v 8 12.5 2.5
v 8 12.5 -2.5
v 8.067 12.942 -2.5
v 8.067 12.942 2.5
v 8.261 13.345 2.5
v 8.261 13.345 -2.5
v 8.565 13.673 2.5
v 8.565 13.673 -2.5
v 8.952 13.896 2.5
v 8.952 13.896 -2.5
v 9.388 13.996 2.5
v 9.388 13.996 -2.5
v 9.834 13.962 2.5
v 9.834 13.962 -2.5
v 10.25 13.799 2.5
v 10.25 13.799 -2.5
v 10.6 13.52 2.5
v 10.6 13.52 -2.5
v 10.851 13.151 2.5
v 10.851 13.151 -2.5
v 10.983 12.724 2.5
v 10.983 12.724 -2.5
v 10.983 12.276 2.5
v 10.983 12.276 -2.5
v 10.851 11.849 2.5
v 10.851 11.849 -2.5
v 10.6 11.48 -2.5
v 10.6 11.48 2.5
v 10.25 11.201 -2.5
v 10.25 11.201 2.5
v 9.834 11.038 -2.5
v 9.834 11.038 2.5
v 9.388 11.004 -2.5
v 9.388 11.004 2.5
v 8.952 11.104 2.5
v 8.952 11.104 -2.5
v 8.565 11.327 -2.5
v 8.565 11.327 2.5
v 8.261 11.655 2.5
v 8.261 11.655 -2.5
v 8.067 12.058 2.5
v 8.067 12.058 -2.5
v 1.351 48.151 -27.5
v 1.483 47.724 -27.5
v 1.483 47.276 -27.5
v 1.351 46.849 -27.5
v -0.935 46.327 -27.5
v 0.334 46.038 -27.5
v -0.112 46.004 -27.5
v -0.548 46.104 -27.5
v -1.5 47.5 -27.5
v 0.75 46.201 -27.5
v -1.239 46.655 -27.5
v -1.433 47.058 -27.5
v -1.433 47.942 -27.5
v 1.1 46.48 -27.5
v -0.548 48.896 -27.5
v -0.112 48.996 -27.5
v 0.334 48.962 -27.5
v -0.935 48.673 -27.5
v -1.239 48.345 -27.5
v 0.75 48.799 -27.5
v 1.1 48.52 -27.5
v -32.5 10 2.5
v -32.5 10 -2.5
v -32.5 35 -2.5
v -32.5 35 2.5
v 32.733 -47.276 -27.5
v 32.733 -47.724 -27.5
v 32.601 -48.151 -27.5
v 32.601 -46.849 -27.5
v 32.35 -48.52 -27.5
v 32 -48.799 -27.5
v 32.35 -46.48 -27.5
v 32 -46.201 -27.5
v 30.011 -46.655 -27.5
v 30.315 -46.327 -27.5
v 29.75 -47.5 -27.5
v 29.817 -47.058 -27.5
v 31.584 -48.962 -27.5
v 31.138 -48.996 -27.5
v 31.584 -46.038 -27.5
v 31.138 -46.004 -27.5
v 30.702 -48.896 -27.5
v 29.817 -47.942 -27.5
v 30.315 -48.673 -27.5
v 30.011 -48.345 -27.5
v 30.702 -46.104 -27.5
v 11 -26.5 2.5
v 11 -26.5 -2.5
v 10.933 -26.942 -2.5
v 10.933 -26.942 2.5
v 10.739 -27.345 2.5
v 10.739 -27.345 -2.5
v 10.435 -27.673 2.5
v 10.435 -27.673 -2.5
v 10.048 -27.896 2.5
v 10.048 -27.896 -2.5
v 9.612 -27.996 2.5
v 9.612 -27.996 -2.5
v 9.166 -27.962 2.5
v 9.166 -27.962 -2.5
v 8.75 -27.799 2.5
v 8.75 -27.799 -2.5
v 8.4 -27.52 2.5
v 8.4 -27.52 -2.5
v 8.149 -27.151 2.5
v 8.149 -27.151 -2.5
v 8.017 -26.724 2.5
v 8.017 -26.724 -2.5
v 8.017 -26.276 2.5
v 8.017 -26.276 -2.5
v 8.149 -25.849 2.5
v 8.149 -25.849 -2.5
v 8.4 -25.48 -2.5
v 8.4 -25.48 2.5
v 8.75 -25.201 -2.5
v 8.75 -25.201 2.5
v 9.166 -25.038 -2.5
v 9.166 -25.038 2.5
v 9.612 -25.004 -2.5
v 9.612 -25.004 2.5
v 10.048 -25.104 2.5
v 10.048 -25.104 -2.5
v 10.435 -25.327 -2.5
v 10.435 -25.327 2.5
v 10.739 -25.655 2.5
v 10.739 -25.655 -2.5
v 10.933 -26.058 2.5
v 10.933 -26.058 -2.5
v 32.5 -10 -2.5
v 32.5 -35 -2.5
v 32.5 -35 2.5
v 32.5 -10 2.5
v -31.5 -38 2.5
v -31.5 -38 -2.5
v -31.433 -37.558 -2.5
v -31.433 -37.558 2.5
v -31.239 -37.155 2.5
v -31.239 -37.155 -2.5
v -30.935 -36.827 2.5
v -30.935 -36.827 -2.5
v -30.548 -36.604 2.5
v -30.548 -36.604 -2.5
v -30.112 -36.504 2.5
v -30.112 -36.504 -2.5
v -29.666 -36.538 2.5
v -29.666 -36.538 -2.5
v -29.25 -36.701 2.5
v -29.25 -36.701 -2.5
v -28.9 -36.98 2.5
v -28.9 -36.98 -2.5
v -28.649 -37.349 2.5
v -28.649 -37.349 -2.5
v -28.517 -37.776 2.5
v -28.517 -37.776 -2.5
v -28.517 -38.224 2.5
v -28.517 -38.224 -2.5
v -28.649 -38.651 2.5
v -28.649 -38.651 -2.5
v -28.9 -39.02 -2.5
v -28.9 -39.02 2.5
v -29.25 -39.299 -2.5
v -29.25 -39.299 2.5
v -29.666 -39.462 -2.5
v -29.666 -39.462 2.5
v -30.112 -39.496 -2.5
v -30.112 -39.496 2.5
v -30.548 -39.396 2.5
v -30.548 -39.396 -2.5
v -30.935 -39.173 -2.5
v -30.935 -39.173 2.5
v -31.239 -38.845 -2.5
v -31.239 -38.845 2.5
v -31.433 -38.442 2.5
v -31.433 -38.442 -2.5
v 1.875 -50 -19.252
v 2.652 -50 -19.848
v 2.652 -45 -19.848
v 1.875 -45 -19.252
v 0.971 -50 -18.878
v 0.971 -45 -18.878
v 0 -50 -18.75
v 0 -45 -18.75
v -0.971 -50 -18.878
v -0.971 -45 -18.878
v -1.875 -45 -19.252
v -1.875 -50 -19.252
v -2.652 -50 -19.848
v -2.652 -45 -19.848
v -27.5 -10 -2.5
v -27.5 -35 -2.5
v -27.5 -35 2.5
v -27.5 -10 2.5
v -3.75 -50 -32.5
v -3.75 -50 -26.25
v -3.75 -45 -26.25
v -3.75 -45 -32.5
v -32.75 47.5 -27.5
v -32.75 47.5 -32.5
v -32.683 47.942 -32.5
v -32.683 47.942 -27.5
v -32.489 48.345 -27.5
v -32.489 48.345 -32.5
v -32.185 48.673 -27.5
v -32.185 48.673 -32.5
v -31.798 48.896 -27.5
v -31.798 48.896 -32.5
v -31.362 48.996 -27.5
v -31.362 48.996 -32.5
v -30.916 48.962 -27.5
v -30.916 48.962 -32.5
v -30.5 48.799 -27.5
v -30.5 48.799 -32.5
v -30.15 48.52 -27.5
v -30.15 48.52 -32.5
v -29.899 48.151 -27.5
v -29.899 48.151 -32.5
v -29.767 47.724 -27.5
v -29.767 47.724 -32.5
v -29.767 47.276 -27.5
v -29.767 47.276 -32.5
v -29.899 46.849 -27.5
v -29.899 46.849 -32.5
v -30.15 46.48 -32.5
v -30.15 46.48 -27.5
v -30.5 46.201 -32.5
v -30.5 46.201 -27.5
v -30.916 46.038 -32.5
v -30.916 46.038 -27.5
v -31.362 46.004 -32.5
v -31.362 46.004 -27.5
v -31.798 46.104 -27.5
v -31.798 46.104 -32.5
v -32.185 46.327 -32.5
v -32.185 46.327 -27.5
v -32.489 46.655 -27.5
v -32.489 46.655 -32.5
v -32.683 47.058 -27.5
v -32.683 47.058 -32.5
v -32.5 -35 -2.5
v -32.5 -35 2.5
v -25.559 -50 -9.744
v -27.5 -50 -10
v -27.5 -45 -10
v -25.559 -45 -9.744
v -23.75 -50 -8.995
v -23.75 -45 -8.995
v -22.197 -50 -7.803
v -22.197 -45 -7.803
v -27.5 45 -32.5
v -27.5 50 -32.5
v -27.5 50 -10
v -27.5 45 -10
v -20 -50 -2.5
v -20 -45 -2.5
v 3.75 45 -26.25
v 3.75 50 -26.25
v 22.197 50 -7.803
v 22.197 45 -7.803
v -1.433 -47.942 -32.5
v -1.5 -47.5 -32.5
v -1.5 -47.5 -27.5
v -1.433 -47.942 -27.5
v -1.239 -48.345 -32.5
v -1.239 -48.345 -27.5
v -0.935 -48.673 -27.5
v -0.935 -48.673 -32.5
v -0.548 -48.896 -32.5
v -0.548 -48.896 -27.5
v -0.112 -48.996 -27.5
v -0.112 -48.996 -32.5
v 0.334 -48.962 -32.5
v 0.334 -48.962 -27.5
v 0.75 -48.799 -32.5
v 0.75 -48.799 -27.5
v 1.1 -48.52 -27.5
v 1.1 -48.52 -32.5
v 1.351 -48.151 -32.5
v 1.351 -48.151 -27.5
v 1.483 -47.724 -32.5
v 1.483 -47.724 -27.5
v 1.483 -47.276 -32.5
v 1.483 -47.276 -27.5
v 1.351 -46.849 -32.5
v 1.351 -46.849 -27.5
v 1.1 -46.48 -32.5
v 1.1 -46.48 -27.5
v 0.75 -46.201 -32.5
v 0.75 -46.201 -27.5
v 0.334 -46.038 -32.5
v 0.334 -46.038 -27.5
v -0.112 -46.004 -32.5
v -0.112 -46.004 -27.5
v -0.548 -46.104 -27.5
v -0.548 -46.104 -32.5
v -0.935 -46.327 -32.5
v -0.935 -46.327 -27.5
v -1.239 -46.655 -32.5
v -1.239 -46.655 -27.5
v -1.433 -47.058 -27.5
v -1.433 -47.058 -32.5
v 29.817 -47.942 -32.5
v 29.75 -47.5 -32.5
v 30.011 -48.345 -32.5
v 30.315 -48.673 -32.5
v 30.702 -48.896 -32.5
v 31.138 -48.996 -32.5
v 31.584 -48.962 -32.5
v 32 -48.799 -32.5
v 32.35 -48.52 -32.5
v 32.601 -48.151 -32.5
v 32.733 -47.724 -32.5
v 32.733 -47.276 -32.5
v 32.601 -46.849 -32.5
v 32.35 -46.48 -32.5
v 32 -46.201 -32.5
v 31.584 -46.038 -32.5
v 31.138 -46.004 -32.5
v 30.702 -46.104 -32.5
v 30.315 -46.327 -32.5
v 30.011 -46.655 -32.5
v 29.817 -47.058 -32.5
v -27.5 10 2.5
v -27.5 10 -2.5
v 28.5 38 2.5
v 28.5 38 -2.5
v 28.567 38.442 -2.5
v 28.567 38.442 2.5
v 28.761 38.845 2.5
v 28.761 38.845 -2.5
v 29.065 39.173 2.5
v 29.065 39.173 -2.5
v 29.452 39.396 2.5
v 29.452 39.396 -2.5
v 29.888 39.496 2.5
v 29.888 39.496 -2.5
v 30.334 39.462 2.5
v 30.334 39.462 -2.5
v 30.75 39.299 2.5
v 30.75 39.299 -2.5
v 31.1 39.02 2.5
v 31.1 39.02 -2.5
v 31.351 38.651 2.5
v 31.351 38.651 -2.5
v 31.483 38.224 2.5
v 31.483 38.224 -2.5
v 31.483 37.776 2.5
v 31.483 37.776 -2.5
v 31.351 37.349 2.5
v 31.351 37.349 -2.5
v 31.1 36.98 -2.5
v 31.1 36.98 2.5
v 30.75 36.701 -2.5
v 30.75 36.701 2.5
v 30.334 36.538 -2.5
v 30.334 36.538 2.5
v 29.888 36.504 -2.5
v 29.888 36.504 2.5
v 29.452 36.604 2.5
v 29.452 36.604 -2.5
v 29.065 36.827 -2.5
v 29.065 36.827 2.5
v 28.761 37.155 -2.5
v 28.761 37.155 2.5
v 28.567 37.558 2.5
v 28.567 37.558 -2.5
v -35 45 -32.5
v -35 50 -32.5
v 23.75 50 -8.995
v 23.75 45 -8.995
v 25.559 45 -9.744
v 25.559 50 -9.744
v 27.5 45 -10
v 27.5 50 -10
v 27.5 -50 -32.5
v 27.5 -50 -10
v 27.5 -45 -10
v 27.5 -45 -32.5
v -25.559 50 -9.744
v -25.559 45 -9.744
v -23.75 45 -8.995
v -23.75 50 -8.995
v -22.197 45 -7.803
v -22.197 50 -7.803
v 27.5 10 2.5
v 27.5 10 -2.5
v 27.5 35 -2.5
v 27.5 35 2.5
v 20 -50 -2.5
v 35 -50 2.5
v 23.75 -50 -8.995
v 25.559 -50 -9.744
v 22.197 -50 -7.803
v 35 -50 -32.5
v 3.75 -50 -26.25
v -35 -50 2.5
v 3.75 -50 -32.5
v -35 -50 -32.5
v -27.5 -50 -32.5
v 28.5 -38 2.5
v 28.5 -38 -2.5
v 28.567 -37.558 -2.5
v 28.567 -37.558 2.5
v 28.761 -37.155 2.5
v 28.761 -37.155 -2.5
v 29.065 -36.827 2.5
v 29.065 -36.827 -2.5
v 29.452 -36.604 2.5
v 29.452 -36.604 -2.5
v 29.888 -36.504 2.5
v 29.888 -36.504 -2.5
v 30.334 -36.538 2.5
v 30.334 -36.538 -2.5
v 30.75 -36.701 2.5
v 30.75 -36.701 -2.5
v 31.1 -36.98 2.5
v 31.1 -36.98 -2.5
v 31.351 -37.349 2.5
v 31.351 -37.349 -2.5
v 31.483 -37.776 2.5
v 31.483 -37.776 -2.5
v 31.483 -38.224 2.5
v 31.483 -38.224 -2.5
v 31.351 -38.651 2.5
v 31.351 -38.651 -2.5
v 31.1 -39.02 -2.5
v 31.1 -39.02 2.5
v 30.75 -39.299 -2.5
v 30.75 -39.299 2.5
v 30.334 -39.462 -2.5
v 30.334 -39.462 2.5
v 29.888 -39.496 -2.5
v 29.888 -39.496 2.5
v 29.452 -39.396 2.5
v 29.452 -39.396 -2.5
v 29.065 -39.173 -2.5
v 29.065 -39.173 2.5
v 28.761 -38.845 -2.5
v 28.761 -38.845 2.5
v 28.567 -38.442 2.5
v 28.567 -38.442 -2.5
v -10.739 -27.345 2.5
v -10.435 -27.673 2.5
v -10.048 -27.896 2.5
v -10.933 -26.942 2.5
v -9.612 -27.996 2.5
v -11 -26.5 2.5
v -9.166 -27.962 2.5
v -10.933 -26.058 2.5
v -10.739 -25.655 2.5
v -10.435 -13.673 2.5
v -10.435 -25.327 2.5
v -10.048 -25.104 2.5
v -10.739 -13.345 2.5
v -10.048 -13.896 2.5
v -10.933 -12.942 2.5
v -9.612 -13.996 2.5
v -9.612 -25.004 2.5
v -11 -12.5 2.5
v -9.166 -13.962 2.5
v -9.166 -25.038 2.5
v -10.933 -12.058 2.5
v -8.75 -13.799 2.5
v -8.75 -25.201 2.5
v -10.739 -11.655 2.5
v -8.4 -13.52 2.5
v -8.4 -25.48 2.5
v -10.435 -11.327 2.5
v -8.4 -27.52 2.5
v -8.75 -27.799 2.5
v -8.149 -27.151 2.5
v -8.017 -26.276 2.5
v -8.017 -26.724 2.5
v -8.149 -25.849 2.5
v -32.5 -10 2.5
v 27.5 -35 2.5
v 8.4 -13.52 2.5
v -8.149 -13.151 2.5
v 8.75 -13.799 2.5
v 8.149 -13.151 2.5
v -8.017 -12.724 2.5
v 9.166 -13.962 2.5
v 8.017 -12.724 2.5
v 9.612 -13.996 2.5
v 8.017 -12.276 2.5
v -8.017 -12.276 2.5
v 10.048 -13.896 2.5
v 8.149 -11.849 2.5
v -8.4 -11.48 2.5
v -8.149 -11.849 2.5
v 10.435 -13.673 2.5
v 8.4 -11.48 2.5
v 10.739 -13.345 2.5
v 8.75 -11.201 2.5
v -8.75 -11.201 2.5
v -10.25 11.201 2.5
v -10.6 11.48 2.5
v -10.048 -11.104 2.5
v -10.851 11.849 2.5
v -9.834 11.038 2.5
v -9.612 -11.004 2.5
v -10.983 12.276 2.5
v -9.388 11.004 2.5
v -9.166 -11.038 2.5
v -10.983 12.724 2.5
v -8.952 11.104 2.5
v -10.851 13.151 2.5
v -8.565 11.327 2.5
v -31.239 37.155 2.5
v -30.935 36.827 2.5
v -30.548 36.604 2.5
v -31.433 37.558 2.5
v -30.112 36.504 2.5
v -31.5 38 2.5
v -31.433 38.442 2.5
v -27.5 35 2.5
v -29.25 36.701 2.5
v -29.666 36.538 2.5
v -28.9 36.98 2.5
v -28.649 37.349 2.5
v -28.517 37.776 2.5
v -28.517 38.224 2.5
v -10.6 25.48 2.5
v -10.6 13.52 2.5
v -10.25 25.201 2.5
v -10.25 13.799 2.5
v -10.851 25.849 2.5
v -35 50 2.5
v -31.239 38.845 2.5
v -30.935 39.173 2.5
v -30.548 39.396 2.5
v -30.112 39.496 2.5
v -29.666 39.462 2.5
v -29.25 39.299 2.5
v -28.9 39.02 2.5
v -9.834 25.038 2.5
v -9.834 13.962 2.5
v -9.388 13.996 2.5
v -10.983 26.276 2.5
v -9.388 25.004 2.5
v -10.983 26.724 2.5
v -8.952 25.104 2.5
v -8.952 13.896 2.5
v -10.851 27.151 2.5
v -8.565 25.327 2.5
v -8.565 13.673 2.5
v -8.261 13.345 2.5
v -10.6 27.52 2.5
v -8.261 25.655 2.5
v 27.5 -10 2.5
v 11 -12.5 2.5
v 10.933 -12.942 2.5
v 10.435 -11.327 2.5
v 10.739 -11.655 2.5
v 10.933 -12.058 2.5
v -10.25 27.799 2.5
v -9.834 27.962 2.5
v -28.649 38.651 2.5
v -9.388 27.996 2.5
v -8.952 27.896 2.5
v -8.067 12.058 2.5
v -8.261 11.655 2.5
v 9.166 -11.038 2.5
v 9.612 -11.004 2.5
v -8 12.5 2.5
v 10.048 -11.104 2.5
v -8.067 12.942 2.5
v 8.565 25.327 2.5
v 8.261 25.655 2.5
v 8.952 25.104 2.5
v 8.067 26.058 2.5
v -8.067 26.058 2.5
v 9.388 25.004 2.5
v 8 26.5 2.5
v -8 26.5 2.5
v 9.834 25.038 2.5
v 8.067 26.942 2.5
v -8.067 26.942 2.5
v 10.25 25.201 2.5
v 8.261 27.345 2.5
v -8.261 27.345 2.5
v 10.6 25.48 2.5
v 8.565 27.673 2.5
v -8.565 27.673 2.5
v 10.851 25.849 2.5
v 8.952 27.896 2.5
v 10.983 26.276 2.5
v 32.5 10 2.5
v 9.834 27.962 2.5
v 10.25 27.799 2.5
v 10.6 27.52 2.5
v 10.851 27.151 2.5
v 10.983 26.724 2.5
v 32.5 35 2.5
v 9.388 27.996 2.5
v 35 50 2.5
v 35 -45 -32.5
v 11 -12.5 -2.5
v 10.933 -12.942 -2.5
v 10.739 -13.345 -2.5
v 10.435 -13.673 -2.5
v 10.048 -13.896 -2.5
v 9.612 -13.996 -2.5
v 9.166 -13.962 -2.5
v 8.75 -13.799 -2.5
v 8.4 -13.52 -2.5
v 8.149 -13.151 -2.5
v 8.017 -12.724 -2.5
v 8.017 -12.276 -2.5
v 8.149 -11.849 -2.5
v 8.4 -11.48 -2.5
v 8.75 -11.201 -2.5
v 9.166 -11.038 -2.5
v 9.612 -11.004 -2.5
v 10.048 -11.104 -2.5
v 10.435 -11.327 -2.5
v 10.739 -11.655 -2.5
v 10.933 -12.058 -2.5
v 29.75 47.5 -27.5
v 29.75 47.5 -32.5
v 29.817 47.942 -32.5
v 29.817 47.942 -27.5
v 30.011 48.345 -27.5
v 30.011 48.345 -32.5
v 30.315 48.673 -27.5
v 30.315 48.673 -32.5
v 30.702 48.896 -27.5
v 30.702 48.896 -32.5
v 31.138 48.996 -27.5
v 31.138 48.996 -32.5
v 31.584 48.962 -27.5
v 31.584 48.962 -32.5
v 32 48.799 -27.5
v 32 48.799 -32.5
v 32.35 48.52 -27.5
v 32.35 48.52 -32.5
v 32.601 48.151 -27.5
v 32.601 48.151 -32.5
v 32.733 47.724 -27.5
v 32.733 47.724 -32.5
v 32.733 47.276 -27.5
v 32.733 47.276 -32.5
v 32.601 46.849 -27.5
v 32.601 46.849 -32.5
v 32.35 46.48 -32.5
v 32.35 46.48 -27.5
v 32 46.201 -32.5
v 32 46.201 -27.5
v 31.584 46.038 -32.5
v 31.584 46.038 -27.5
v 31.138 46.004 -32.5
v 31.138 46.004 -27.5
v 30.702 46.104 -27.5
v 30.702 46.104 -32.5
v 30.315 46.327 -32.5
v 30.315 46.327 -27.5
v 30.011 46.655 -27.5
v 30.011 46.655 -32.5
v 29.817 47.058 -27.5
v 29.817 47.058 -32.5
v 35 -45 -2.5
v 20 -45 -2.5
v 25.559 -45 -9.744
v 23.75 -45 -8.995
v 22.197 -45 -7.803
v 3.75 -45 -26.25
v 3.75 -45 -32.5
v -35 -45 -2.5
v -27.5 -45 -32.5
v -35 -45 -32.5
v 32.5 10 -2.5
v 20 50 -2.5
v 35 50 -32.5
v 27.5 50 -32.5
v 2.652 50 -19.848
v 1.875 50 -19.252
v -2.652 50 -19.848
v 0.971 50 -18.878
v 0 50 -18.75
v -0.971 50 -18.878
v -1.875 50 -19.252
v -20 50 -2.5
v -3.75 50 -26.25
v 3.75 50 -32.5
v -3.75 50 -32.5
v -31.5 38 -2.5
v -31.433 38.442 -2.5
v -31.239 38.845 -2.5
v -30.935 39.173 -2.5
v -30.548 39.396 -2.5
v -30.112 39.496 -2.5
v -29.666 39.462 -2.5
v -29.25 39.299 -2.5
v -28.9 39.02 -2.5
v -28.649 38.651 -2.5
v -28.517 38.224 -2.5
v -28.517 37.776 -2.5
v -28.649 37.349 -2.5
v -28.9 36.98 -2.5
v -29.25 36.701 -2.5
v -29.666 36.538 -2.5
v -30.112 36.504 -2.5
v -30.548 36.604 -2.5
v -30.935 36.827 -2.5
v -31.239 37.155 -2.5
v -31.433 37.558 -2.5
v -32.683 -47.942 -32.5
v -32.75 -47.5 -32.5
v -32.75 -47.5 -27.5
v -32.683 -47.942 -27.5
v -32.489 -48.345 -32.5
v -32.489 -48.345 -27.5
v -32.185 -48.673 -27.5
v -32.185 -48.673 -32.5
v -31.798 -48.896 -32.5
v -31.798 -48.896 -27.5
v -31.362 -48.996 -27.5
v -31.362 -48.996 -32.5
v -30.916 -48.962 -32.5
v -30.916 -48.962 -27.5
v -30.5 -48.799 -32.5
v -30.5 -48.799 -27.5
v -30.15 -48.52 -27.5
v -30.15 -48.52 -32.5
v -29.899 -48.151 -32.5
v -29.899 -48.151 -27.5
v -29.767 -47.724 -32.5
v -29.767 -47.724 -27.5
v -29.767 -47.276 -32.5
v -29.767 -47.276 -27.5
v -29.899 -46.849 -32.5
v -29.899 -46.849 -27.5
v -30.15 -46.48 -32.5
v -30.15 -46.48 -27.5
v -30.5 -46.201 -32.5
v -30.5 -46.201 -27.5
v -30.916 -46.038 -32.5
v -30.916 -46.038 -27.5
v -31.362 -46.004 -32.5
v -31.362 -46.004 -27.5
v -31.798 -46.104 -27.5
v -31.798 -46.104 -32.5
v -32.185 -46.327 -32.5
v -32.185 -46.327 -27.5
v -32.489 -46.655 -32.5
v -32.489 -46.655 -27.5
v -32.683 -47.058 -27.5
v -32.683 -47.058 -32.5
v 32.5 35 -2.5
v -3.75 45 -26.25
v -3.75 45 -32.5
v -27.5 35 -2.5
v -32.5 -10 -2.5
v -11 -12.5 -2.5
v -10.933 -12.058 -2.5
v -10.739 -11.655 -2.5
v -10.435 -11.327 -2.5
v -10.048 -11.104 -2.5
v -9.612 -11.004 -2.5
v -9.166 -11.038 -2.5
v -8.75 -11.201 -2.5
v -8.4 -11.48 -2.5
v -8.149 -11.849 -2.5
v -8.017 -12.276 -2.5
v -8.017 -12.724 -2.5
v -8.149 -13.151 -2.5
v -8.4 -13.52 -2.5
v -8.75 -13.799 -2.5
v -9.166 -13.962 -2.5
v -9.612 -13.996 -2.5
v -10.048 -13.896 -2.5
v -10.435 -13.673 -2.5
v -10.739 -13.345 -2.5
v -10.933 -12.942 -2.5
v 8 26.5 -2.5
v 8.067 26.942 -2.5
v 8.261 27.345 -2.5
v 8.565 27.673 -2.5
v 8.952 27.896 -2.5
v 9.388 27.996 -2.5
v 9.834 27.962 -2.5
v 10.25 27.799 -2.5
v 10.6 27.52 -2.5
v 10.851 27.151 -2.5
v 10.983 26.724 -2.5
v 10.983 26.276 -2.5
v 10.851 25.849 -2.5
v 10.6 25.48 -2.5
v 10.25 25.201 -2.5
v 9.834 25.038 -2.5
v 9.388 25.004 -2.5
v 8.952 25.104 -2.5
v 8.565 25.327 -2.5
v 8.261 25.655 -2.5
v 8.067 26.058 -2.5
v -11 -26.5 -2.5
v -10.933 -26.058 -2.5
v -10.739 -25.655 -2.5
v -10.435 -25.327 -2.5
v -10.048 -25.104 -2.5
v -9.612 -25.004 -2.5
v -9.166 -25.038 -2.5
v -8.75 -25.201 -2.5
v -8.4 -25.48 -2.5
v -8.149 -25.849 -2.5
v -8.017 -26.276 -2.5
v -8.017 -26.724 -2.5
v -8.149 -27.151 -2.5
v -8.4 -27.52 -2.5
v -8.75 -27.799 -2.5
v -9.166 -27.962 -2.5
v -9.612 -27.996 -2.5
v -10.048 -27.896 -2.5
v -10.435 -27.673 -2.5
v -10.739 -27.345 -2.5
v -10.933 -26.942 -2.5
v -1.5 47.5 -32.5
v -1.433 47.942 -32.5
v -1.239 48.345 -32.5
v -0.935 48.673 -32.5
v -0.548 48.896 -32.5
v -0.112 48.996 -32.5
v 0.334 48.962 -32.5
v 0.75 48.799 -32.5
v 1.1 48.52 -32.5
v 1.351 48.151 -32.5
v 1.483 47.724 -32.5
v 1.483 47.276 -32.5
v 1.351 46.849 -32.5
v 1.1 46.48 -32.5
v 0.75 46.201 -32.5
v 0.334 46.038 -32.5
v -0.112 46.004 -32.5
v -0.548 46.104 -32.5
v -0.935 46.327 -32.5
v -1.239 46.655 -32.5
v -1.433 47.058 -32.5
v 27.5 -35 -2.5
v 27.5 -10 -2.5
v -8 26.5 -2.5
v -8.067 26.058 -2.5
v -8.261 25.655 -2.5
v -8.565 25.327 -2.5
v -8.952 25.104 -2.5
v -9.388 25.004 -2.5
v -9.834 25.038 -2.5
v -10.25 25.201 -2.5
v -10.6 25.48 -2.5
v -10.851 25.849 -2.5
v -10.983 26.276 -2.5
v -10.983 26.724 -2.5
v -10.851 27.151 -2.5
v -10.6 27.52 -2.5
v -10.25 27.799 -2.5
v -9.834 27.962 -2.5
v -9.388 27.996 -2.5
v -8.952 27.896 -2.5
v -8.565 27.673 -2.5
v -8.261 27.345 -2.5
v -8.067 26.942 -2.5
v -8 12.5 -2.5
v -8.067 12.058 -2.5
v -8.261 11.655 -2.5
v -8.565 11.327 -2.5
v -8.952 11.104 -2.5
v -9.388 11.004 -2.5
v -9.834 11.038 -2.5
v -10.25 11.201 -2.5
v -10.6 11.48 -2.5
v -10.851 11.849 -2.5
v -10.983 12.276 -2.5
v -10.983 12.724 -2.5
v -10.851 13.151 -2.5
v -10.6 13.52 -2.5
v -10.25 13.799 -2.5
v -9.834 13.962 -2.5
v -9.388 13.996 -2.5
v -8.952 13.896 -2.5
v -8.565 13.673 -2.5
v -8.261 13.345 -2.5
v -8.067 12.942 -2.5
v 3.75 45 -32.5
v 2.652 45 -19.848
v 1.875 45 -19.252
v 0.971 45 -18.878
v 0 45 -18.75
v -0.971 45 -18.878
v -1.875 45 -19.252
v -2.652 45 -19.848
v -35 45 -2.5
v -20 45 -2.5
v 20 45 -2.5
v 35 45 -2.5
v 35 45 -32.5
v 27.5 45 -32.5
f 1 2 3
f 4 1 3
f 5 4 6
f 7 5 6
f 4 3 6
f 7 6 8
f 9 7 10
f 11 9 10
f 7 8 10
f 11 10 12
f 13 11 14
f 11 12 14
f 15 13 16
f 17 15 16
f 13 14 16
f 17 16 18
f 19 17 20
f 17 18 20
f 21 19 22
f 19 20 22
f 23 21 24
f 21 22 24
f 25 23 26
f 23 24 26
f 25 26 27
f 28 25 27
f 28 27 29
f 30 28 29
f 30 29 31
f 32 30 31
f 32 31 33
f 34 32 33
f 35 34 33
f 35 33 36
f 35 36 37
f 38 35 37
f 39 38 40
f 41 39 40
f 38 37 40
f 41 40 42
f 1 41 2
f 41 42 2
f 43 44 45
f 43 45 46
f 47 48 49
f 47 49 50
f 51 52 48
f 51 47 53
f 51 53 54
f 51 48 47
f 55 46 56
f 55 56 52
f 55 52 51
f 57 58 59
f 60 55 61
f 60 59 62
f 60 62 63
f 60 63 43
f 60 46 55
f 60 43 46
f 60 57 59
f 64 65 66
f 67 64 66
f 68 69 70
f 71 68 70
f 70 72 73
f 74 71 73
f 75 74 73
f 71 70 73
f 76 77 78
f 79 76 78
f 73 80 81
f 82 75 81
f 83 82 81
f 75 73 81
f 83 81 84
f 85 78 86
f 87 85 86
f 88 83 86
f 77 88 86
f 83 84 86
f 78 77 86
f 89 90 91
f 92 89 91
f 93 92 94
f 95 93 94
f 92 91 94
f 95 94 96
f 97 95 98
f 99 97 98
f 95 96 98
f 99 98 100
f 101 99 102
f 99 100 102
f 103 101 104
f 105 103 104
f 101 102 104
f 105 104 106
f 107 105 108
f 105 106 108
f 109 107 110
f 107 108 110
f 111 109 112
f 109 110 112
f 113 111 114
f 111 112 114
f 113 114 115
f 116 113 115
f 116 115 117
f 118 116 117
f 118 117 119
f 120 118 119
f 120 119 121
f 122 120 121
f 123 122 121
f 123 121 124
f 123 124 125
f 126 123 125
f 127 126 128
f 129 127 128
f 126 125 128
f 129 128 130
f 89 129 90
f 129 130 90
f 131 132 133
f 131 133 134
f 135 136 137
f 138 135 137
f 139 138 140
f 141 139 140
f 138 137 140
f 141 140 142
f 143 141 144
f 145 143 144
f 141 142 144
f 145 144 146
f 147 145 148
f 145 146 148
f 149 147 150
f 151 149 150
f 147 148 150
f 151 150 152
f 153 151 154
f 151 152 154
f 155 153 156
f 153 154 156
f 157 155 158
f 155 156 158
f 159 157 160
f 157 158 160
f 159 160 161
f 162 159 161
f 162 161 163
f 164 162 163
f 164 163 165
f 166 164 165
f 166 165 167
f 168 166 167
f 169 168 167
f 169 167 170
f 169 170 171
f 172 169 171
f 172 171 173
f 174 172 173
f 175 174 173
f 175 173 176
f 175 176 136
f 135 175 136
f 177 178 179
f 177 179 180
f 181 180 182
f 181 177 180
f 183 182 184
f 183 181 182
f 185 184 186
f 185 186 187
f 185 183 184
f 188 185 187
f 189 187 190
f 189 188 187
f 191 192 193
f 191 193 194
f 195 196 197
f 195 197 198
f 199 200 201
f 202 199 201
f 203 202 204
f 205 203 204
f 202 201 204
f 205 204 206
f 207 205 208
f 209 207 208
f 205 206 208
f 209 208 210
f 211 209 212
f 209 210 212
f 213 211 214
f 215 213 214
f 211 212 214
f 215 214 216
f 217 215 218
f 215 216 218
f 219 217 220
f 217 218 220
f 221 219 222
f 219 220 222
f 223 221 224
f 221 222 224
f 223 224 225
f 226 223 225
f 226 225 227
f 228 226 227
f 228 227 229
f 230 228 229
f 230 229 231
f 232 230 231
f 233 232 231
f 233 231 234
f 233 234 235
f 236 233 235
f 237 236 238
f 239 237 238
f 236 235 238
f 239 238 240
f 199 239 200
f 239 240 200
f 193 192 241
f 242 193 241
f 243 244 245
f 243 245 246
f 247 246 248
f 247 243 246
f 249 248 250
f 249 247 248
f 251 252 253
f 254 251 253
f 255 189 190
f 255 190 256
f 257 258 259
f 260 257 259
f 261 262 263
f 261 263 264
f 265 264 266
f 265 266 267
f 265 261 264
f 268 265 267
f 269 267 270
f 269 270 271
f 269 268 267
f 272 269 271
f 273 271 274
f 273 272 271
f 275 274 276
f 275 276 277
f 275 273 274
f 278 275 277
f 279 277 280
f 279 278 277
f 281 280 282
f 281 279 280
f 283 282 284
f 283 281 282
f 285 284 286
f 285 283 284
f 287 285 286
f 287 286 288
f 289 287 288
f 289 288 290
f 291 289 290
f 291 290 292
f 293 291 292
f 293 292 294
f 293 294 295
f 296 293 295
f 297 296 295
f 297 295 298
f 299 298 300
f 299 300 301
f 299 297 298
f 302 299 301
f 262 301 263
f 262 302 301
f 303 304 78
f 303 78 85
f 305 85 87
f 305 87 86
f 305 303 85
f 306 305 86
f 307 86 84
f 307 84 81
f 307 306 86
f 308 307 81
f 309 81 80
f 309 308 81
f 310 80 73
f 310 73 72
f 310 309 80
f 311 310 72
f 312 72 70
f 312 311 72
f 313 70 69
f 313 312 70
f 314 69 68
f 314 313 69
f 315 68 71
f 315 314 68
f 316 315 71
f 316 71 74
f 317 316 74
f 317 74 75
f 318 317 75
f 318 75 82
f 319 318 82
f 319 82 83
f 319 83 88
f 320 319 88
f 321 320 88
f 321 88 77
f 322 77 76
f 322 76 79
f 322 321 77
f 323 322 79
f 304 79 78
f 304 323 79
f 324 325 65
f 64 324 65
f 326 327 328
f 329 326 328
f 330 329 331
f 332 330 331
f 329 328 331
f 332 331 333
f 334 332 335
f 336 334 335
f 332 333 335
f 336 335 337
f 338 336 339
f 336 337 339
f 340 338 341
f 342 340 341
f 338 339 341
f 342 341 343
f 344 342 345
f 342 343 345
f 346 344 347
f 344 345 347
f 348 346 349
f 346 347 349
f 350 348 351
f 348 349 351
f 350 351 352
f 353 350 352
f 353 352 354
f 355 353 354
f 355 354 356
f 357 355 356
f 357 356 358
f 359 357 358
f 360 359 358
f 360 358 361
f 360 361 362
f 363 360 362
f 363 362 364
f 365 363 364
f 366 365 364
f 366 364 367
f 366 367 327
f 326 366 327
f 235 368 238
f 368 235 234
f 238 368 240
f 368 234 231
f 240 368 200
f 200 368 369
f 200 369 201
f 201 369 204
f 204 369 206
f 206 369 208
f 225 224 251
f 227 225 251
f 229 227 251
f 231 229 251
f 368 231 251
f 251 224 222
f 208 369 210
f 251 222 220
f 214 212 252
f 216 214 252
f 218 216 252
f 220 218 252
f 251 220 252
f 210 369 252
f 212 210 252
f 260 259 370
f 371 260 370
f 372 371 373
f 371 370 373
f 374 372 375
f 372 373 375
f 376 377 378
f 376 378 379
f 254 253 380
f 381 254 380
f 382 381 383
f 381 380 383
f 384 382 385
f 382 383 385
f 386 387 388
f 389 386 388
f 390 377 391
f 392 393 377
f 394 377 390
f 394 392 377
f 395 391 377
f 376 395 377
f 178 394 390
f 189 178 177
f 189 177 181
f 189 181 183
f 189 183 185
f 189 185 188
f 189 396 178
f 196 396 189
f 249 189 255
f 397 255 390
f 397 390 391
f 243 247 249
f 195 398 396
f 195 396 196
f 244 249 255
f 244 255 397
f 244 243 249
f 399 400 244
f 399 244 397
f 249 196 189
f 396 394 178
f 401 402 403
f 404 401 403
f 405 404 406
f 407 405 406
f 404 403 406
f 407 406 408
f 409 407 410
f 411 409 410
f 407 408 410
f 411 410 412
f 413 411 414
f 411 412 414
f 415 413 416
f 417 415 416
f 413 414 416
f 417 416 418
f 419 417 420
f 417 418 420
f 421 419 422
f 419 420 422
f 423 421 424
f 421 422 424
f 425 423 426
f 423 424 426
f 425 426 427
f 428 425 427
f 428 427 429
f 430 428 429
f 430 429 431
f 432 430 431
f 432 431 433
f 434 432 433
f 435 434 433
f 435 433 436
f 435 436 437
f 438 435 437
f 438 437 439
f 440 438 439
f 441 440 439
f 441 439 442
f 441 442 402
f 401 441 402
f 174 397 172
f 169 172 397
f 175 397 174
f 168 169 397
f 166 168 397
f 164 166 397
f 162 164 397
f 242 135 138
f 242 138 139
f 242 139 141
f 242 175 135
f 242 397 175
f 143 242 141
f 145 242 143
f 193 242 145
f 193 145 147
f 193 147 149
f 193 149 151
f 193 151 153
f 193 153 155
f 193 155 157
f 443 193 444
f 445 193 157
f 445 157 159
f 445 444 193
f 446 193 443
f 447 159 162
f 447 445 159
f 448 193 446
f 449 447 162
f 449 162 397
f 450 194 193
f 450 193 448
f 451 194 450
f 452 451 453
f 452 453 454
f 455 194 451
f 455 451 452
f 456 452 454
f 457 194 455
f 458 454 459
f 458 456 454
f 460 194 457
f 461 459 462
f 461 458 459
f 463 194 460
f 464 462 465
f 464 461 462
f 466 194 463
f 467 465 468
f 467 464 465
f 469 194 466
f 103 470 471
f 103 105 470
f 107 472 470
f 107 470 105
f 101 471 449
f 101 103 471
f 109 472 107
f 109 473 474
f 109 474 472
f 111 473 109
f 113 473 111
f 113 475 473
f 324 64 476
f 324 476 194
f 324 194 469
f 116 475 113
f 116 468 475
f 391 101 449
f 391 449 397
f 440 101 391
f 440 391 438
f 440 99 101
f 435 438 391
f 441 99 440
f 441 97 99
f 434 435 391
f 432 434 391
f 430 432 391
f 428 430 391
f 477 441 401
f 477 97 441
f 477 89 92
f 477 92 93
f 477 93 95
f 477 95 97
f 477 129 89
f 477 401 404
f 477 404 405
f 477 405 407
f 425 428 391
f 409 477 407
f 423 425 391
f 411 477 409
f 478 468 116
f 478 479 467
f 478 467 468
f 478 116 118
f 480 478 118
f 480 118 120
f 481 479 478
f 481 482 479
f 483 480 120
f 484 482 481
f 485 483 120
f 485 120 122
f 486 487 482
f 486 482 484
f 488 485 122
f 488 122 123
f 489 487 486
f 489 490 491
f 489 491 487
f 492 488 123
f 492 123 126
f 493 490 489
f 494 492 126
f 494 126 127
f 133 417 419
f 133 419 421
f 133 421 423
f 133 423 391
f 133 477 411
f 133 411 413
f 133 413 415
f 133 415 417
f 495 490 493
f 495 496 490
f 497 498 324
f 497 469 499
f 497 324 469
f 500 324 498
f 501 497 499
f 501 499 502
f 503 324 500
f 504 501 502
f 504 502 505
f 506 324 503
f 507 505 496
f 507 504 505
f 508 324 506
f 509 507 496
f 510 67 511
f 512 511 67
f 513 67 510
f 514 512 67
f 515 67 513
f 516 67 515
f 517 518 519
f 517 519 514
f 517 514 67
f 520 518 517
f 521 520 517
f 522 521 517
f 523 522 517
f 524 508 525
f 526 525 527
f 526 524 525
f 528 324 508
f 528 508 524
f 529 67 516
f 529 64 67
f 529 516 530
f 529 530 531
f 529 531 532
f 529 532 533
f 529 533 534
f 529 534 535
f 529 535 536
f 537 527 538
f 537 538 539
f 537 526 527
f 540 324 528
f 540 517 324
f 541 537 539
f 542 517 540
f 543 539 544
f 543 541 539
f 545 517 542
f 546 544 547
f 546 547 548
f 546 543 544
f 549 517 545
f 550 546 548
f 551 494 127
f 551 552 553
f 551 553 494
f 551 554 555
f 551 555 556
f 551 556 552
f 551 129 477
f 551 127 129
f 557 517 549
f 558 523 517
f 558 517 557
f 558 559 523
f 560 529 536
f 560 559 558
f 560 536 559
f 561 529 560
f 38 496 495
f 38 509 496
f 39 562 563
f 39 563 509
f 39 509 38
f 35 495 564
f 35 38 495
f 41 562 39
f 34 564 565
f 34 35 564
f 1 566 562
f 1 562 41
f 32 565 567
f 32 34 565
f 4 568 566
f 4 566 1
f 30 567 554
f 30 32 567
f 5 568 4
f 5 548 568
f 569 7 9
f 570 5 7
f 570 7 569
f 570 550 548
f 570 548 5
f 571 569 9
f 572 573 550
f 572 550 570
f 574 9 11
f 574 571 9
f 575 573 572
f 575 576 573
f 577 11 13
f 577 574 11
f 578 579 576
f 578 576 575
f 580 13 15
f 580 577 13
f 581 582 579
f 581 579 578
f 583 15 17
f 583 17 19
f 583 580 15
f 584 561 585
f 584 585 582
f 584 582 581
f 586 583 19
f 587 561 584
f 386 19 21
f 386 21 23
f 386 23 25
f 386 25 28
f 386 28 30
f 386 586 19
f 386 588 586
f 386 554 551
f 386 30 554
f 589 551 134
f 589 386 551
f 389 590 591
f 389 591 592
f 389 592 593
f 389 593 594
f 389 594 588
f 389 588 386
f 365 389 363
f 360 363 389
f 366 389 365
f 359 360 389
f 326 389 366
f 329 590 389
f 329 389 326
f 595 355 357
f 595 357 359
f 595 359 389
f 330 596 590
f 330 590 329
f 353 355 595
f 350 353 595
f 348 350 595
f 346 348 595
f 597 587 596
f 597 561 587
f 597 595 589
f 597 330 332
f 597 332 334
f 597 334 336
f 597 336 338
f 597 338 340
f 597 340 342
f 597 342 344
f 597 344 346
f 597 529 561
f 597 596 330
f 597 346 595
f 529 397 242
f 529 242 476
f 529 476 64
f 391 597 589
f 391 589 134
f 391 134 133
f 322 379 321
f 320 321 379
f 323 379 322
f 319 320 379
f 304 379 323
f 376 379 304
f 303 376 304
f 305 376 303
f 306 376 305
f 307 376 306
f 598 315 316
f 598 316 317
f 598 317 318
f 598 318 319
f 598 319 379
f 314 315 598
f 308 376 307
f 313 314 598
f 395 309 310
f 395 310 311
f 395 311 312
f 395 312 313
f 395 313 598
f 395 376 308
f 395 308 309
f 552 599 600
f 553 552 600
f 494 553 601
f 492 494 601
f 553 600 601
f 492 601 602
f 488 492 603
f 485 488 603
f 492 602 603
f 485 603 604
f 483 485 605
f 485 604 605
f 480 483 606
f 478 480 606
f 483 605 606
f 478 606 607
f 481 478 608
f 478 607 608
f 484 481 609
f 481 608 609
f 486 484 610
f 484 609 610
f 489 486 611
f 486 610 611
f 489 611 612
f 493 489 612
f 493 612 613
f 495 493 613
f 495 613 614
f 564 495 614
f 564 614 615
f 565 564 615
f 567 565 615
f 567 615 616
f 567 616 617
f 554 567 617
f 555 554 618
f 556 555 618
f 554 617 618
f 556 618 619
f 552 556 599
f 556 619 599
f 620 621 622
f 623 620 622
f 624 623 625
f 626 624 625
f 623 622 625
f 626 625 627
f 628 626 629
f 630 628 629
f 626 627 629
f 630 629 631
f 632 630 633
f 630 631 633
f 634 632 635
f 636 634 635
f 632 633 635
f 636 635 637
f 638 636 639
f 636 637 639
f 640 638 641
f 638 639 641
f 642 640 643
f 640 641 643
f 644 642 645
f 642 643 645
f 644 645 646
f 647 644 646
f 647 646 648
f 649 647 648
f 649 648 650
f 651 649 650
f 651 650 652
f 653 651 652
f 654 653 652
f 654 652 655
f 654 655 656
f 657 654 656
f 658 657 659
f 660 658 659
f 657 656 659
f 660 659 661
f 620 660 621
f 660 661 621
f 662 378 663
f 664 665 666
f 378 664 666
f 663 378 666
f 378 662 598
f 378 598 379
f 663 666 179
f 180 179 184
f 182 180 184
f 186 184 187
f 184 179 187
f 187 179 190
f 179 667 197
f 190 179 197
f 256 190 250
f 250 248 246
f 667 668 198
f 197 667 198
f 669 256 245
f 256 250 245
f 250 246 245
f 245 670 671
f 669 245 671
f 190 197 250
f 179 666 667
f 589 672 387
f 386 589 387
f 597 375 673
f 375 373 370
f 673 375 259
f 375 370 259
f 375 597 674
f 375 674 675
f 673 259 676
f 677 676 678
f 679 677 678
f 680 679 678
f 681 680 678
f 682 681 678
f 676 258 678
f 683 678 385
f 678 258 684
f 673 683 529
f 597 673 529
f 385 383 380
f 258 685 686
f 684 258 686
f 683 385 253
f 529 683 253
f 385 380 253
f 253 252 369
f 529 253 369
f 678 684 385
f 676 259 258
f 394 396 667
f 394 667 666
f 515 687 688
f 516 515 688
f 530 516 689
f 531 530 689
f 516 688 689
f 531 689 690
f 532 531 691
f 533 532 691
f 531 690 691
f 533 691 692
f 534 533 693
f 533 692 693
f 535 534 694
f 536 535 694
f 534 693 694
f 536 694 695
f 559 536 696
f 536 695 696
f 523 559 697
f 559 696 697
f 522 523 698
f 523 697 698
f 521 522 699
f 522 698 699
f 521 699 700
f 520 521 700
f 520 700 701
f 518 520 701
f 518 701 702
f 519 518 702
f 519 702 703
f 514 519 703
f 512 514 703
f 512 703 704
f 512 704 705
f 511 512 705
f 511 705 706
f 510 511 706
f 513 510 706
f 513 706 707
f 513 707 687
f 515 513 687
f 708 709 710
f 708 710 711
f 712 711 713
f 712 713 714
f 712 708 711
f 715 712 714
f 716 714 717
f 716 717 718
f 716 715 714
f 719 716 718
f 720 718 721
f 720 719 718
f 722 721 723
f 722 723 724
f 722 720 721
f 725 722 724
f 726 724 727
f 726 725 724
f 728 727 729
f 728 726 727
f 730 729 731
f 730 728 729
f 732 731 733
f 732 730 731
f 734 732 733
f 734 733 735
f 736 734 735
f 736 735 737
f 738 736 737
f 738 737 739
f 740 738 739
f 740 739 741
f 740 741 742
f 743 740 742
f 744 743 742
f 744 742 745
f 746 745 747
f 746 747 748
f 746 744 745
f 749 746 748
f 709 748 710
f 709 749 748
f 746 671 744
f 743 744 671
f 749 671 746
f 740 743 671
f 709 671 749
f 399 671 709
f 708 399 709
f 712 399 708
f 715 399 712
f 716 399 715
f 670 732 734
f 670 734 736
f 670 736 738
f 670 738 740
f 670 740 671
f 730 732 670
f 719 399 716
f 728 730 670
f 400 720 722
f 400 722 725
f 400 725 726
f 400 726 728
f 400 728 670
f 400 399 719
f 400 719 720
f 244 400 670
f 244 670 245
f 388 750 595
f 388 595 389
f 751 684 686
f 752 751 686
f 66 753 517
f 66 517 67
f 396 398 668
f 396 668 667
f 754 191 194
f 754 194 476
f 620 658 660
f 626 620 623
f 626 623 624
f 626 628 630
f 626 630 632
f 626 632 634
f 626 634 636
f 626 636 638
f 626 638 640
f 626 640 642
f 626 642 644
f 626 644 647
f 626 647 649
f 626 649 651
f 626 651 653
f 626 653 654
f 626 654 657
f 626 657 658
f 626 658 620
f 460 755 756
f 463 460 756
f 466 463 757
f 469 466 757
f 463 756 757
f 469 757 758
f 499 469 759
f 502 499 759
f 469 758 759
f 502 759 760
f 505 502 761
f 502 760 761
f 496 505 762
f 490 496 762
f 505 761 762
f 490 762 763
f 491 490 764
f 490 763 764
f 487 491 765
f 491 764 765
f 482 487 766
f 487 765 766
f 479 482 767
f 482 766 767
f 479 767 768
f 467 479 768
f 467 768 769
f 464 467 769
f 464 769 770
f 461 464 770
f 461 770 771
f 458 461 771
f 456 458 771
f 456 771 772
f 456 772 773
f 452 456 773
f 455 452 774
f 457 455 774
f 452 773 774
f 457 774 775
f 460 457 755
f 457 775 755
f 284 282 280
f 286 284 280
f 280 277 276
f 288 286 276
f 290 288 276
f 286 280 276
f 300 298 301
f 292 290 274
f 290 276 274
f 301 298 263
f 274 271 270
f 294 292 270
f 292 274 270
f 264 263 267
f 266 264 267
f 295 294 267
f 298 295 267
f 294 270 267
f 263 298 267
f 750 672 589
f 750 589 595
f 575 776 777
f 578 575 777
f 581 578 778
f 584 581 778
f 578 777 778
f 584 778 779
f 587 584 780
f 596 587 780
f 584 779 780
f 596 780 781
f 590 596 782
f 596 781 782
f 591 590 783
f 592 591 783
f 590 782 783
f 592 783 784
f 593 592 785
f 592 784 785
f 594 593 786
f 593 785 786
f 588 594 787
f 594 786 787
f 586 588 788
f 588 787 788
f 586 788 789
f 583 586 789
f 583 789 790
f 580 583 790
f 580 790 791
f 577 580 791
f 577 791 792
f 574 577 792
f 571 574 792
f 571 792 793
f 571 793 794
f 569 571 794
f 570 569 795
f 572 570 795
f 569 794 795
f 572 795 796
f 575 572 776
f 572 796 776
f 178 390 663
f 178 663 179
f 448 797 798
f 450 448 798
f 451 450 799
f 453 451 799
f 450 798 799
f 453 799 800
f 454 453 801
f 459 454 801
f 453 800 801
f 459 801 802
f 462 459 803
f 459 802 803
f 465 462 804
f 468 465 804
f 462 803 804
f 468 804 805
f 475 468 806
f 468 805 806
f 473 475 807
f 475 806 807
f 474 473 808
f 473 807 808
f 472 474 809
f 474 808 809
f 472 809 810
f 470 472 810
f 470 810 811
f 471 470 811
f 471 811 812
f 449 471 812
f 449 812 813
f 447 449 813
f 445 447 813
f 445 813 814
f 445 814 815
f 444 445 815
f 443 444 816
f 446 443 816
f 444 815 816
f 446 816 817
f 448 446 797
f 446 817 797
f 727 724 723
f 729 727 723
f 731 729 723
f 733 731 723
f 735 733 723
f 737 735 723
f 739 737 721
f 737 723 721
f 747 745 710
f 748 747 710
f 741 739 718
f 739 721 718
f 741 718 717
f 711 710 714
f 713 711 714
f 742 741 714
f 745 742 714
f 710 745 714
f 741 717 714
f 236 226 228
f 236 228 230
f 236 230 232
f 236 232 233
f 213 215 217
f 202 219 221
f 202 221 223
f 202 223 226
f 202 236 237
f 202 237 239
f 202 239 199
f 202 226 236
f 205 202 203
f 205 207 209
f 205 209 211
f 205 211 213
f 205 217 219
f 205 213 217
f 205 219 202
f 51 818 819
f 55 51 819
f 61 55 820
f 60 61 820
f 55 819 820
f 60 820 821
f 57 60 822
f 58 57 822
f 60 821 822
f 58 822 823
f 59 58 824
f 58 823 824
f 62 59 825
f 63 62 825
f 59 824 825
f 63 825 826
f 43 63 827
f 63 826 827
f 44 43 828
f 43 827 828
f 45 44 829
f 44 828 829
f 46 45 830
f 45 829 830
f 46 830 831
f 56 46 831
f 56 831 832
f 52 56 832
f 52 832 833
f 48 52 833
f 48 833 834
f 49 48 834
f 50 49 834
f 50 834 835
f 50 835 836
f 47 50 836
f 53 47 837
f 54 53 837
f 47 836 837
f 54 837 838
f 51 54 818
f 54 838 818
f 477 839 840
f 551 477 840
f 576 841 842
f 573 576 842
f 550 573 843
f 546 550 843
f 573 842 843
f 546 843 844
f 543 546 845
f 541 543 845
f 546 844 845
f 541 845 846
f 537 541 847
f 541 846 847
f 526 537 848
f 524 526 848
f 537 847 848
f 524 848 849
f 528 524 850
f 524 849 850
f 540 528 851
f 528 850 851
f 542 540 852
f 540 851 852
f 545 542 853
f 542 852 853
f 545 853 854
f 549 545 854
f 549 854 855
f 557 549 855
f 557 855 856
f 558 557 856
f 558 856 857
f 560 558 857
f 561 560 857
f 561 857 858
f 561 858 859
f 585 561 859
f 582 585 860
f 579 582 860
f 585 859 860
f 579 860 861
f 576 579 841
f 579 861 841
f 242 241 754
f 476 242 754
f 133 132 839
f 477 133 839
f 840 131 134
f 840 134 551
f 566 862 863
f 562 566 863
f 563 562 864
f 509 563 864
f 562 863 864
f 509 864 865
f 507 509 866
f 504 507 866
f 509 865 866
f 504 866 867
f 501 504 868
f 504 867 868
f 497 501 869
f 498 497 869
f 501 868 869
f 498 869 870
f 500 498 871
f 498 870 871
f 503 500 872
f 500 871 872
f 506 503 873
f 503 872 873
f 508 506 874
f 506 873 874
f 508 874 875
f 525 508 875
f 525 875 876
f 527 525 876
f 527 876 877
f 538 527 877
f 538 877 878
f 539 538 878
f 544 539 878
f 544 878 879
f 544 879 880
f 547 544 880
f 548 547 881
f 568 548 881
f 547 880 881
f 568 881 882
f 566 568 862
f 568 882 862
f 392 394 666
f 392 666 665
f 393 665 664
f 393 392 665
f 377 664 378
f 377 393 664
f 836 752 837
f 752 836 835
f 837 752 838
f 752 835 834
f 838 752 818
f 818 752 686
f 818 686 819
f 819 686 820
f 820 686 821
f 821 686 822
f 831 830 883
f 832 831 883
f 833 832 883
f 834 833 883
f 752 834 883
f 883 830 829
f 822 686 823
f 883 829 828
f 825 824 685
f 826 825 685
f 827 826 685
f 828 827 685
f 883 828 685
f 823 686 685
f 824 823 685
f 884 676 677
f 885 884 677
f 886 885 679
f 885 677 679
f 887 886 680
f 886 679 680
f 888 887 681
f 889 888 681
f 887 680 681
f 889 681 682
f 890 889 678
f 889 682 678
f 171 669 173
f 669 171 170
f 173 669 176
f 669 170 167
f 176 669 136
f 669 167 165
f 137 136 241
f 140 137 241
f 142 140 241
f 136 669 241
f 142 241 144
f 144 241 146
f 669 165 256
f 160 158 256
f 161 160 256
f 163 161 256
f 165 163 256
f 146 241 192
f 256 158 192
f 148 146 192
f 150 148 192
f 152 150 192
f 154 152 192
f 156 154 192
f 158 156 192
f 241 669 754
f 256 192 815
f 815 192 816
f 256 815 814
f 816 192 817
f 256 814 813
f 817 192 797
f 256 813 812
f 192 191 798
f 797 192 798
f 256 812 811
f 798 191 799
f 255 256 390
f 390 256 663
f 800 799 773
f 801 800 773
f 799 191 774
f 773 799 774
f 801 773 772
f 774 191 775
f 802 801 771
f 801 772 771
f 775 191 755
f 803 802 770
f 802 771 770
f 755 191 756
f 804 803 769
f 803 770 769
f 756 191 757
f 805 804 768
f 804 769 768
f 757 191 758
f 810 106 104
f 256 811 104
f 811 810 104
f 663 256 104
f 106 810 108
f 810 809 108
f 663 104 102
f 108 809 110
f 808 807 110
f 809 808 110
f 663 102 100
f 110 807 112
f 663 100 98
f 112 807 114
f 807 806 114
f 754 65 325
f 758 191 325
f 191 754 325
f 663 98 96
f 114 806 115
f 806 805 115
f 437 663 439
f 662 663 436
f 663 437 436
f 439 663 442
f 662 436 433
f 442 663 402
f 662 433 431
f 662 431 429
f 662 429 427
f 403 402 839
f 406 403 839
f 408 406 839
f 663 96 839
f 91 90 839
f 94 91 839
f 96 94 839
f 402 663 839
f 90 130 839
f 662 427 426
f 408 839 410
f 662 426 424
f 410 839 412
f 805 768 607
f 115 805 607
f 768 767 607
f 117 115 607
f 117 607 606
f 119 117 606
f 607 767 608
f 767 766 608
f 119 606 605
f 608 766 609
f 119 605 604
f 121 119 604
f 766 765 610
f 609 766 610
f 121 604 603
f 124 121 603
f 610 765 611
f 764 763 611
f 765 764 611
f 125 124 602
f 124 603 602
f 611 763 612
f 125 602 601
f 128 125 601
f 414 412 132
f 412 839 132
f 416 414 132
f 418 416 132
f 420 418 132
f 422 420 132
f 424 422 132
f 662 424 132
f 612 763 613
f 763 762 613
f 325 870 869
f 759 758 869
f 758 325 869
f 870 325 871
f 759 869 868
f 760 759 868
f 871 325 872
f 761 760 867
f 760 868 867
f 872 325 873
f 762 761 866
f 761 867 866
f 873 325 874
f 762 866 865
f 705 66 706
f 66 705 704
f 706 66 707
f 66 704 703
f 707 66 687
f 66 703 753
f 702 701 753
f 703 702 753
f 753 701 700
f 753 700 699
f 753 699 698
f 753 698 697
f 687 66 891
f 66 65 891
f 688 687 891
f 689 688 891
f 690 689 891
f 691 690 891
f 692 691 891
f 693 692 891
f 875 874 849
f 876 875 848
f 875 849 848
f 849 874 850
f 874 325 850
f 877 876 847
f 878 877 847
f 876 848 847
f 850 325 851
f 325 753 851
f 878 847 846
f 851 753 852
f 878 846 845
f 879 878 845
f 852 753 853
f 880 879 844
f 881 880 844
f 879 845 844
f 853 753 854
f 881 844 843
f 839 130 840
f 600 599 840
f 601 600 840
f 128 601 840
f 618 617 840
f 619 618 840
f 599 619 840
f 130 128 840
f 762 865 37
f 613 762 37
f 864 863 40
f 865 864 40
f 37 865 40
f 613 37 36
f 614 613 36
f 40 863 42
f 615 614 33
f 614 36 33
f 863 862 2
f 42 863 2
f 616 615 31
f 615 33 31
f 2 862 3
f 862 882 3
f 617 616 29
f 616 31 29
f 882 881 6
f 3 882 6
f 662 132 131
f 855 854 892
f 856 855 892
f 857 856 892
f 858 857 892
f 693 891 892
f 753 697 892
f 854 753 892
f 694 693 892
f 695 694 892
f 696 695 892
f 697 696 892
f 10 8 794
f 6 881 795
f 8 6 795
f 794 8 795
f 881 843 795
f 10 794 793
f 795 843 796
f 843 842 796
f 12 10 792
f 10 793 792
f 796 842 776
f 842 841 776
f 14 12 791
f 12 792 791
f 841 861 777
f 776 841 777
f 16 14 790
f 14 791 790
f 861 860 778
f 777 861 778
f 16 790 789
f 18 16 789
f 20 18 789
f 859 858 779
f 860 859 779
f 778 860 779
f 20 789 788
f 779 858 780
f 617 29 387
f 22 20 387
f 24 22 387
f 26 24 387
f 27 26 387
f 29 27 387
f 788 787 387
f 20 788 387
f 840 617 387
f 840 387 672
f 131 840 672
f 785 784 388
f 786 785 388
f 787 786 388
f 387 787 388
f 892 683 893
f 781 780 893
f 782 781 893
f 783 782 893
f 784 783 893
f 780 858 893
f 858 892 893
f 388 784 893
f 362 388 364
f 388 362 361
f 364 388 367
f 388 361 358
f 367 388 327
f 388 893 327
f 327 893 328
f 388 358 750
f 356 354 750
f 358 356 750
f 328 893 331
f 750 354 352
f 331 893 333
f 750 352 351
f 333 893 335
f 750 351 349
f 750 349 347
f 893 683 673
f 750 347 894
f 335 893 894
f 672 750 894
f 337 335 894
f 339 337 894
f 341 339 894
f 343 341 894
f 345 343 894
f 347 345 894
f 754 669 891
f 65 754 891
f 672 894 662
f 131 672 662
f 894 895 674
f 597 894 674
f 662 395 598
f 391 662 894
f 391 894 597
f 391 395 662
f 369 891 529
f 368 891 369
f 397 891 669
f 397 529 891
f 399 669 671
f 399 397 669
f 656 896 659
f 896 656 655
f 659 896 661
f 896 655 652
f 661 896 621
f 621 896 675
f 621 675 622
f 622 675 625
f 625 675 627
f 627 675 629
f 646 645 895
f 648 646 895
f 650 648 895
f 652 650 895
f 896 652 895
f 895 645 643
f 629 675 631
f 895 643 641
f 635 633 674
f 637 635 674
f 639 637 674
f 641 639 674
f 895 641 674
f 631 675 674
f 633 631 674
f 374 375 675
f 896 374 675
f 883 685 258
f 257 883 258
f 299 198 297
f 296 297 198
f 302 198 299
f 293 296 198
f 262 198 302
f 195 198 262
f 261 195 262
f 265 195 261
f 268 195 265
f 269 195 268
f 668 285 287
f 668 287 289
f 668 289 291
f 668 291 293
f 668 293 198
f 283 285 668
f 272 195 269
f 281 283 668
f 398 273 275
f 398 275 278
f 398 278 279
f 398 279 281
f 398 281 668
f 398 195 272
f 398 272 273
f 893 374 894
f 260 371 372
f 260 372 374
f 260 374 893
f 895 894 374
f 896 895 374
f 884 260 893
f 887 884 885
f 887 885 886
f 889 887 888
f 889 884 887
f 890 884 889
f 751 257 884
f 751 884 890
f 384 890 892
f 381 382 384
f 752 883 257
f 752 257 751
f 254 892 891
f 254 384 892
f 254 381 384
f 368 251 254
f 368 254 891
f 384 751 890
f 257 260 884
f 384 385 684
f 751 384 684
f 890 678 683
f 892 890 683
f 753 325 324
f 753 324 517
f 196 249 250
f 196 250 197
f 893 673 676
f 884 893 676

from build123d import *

# Parameters (mm, degrees)
SKETCH1_W           = 70
SKETCH1_H           = 100
BOSS_EXTRUDE1_DEPTH = 2.5
SKETCH2_R           = 1.5
CUT_EXTRUDE1_DEPTH  = 10
BOSS_EXTRUDE2_DEPTH = 5
SKETCH4_W           = 5
SKETCH4_H           = 25
SKETCH4_R           = 1.5
CUT_EXTRUDE2_DEPTH  = 5
SKETCH7_R           = 1.5
CUT_EXTRUDE3_DEPTH  = 5


with BuildPart() as part:
    # Sketch1 → Boss-Extrude1 (new, symmetric)
    with BuildSketch(Plane.XY):
        Rectangle(SKETCH1_W, SKETCH1_H)
    extrude(amount=BOSS_EXTRUDE1_DEPTH, both=True)

    # Sketch2 → Cut-Extrude1 (cut)
    with BuildSketch(Plane(origin=(0, 0, -2.5), x_dir=(-1, 0, 0), z_dir=(0, 0, -1))):
        with Locations((30, 38)):
            Circle(SKETCH2_R)
        with Locations((-30, 38)):
            Circle(SKETCH2_R)
        with Locations((30, -38)):
            Circle(SKETCH2_R)
        with Locations((-30, -38)):
            Circle(SKETCH2_R)
    extrude(amount=-CUT_EXTRUDE1_DEPTH, mode=Mode.SUBTRACT)

    # Sketch3 → Boss-Extrude2 (add)
    with BuildSketch(Plane(origin=(0, 50, 0), x_dir=(1, 0, 0), z_dir=(0, 1, 0))):
        with BuildLine():
            Line((-35, 2.5), (-35, 32.5))
            Line((-35, 32.5), (-27.5, 32.5))
            Line((-27.5, 32.5), (-27.5, 10))
            ThreePointArc((-27.5, 10), (-24.629874257, 9.429096494), (-22.196699141, 7.803300859))
            Line((-22.196699141, 7.803300859), (-3.75, 26.25))
            Line((-3.75, 26.25), (-3.75, 32.5))
            Line((-3.75, 32.5), (3.75, 32.5))
            Line((3.75, 32.5), (3.75, 26.25))
            Line((3.75, 26.25), (22.196699141, 7.803300859))
            ThreePointArc((22.196699141, 7.803300859), (24.629874257, 9.429096494), (27.5, 10))
            Line((27.5, 10), (27.5, 32.5))
            Line((27.5, 32.5), (35, 32.5))
            Line((35, 32.5), (35, 2.5))
            Line((35, 2.5), (20, 2.5))
            Line((20, 2.5), (2.651650429, 19.848349571))
            ThreePointArc((2.651650429, 19.848349571), (0, 18.75), (-2.651650429, 19.848349571))
            Line((-2.651650429, 19.848349571), (-20, 2.5))
            Line((-20, 2.5), (-35, 2.5))
        make_face()
    boss_extrude2 = extrude(amount=-BOSS_EXTRUDE2_DEPTH)

    # Mirror1: Boss-Extrude2 across plane
    add(boss_extrude2.mirror(Plane.ZX))

    # Sketch4 → Cut-Extrude2 (cut)
    with BuildSketch(Plane(origin=(0, 0, -2.5), x_dir=(-1, 0, 0), z_dir=(0, 0, -1))):
        with Locations((-30, -22.5)):
            Rectangle(SKETCH4_W, SKETCH4_H)
        with Locations(Location((-9.5, -26.5, 0), (0, 0, 180))):
            Circle(SKETCH4_R)
        with Locations(Location((-9.5, -12.5, 0), (0, 0, 180))):
            Circle(SKETCH4_R)
        with Locations((9.5, -12.5)):
            Circle(SKETCH4_R)
        with Locations((9.5, -26.5)):
            Circle(SKETCH4_R)
        with Locations((30, -22.5)):
            Rectangle(SKETCH4_W, SKETCH4_H)
        with Locations((30, 22.5)):
            Rectangle(SKETCH4_W, SKETCH4_H)
        with Locations(Location((9.5, 12.5, 0), (0, 0, 180))):
            Circle(SKETCH4_R)
        with Locations(Location((9.5, 26.5, 0), (0, 0, 180))):
            Circle(SKETCH4_R)
        with Locations((-9.5, 26.5)):
            Circle(SKETCH4_R)
        with Locations((-9.5, 12.5)):
            Circle(SKETCH4_R)
        with Locations((-30, 22.5)):
            Rectangle(SKETCH4_W, SKETCH4_H)
    extrude(amount=-CUT_EXTRUDE2_DEPTH, mode=Mode.SUBTRACT)

    # Sketch7 → Cut-Extrude3 (cut)
    with BuildSketch(Plane(origin=(0, 0, -32.5), x_dir=(-1, 0, 0), z_dir=(0, 0, -1))):
        with Locations((0, 47.5)):
            Circle(SKETCH7_R)
        with Locations((-31.25, 47.5)):
            Circle(SKETCH7_R)
        with Locations((31.25, 47.5)):
            Circle(SKETCH7_R)
    cut_extrude3 = extrude(amount=-CUT_EXTRUDE3_DEPTH, mode=Mode.SUBTRACT)

    # Mirror2: Cut-Extrude3 across plane
    add(cut_extrude3.mirror(Plane.ZX), mode=Mode.SUBTRACT)


solid = part.part
